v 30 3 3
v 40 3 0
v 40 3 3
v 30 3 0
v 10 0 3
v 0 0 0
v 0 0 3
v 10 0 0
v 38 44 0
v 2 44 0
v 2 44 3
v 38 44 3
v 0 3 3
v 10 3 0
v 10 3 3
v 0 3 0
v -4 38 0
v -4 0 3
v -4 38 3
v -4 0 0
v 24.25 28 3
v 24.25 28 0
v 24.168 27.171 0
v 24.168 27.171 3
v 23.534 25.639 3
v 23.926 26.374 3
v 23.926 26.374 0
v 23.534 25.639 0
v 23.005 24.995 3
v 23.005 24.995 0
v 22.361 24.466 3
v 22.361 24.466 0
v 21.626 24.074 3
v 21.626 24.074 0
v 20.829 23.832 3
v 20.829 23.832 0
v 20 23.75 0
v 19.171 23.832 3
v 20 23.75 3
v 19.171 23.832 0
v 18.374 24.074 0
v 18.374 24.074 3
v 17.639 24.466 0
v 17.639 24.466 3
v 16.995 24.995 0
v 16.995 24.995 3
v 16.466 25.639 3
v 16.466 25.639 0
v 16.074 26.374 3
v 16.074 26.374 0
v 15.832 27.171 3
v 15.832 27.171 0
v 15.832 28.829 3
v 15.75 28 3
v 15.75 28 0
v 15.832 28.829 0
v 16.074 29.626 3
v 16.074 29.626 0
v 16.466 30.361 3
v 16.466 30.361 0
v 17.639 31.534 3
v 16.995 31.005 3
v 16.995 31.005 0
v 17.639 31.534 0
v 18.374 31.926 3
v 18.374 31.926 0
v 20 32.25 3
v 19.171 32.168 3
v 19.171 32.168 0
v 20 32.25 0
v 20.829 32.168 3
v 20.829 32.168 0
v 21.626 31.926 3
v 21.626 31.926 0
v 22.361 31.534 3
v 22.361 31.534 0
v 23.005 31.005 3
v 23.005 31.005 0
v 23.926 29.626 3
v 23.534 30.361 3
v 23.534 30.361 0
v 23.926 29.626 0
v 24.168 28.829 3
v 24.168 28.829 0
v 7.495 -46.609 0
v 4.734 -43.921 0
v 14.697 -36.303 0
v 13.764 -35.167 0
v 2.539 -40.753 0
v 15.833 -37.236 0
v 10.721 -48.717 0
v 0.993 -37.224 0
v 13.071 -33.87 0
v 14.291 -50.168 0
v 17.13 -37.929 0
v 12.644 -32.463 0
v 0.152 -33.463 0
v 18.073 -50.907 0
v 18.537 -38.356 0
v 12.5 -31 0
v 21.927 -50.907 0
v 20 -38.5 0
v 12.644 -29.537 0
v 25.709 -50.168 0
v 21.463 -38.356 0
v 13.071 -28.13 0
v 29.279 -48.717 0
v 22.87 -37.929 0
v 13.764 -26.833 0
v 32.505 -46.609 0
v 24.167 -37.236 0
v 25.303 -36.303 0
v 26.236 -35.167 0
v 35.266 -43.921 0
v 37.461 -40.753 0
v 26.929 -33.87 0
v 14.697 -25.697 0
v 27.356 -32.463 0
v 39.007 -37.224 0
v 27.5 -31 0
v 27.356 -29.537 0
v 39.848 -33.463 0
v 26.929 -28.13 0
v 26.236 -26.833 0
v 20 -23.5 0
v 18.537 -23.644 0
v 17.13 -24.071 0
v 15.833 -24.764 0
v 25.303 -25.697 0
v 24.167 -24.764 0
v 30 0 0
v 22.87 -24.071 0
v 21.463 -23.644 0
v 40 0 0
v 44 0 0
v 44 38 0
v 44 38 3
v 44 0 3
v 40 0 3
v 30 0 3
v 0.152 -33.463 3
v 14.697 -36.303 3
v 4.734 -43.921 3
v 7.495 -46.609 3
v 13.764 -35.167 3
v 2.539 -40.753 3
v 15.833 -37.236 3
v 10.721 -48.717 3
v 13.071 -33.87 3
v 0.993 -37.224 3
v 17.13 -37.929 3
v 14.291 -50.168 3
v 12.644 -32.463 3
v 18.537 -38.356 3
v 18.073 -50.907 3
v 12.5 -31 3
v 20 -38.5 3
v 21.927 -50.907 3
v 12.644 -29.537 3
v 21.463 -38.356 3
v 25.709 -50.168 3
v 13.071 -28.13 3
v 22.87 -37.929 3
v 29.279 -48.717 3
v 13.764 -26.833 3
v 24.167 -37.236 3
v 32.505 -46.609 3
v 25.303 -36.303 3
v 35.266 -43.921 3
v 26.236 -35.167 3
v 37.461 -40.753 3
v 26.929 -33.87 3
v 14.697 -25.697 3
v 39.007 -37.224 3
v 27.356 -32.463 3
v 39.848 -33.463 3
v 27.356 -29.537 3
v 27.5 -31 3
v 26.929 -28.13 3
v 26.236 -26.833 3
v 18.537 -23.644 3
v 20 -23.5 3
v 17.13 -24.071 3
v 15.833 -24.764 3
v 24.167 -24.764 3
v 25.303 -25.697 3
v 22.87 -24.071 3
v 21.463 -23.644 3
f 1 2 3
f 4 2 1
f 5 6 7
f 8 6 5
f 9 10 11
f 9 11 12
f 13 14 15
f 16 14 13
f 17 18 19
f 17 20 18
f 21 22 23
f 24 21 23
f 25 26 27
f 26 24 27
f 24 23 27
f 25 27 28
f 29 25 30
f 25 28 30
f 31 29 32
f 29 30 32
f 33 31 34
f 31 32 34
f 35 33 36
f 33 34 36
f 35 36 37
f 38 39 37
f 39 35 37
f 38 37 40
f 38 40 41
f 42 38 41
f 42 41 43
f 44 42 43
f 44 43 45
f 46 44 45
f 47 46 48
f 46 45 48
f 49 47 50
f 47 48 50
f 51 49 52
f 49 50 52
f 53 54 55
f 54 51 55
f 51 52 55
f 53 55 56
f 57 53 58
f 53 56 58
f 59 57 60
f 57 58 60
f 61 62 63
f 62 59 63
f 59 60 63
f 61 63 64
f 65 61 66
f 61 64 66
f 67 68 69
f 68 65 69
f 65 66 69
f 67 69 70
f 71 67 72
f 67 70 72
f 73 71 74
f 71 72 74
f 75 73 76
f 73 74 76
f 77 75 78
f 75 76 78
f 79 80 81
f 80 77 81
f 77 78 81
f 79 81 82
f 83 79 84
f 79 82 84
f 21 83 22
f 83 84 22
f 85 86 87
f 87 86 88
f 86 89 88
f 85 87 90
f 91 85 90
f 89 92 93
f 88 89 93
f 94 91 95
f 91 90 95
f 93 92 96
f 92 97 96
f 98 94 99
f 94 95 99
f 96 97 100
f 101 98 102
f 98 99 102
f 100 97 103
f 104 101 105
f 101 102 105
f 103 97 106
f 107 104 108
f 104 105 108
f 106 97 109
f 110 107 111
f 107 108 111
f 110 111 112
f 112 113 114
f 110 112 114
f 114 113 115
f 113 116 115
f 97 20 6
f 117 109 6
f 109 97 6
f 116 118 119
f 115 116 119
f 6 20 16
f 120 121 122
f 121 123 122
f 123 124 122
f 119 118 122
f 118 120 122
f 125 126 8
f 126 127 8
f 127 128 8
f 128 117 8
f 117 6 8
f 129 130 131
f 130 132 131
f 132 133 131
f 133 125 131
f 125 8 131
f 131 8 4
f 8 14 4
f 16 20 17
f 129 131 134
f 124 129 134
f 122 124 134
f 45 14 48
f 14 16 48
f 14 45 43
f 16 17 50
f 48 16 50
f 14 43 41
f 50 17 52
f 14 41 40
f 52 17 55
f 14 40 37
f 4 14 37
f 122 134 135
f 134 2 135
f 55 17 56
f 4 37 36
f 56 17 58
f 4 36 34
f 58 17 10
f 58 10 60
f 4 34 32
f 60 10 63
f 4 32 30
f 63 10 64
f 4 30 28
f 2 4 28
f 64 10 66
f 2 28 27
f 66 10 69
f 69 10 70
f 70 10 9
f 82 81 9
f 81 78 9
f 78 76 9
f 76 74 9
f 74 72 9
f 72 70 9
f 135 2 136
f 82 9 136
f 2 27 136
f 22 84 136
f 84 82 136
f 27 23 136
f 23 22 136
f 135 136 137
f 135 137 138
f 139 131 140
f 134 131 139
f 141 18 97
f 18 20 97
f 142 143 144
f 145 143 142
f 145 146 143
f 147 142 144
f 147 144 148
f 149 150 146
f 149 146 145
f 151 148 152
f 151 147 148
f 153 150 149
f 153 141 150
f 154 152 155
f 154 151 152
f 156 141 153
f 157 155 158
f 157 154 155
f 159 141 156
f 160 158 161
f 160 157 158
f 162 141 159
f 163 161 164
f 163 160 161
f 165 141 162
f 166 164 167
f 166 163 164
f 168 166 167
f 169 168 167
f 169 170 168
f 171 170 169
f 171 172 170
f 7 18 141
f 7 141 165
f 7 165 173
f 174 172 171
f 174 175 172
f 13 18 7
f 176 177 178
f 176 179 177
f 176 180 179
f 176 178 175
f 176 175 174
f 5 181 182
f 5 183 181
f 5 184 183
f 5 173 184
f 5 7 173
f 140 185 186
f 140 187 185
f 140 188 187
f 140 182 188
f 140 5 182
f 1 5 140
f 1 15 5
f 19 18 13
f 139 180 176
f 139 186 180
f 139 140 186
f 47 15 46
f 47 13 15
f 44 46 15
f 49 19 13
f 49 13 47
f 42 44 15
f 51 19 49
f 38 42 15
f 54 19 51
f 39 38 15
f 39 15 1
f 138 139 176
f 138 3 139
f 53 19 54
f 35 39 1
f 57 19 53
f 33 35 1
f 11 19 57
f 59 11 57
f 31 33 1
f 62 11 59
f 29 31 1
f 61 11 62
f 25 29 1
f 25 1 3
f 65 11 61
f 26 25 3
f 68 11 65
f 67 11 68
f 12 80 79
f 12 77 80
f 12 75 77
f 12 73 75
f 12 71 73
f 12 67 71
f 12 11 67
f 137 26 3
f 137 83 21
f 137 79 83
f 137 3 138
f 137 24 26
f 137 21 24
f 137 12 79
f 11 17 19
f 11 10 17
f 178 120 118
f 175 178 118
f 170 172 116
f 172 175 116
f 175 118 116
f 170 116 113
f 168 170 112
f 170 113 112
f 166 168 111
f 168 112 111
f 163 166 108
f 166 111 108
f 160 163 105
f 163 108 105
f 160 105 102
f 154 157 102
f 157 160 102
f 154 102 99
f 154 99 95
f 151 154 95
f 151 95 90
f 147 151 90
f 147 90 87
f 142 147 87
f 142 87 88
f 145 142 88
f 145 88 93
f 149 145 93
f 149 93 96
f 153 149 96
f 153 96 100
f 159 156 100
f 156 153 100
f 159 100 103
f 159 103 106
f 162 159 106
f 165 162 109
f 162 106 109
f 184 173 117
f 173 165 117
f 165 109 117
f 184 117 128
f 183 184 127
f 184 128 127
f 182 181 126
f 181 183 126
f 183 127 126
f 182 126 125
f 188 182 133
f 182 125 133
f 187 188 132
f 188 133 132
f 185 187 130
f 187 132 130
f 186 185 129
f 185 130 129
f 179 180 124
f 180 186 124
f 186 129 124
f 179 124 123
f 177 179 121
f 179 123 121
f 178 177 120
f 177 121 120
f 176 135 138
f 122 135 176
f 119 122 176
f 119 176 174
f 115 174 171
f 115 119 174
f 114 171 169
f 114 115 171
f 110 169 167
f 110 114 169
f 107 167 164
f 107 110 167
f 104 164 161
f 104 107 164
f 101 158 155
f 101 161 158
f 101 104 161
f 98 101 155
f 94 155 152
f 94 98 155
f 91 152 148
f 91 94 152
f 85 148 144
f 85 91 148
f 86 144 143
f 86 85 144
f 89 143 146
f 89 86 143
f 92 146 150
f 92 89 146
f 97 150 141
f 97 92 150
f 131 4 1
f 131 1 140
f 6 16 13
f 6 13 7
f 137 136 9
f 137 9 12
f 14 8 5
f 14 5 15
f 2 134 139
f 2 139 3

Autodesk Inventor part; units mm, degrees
ref_plane "YZ Plane" through (0, 0, 0) normal (1, 0, 0) x (0, 1, 0)
ref_plane "XZ Plane" through (0, 0, 0) normal (0, 1, 0) x (-1, 0, 0)
ref_plane "XY Plane" through (0, 0, 0) normal (0, 0, 1) x (1, 0, 0)
sketch "Sketch1" plane through (0, 0, 0) normal (0, 0, 1) x (1, 0, 0)
  line L0 (0, 0) -> (10, 0)
  line L1 (10, 0) -> (10, 3)
  line L2 (10, 3) -> (0, 3)
  line L3 (0, 3) -> (0, 0)
  line L4 (30, 0) -> (40, 0)
  line L5 (40, 0) -> (40, 3)
  line L6 (40, 3) -> (30, 3)
  line L7 (30, 3) -> (30, 0)
  line L8 (0, 0) -> (40, 0)
  line L9 (40, 0) -> (40, 40)
  line L10 (40, 40) -> (0, 40)
  line L11 (0, 40) -> (0, 0)
  circle A0 centre (20, -31) radius 7.5
  circle A1 centre (20, -31) radius 20
  line L12 (-4, 44) -> (44, 44)
  line L13 (44, 44) -> (44, 0)
  line L14 (44, 0) -> (-4, 0)
  line L15 (-4, 0) -> (-4, 44)
  line L16 (-4, 0) -> (0.1522, -33.4628)
  line L17 (44, 0) -> (39.8478, -33.4628)
  circle A2 centre (20, 28) radius 4.25
  line L18 (10, 3) -> (30, 3)
  point P0 (20, 0)
  point P1 (1.3083, -38.1147)
  point P2 (38.6917, -38.1147)
  point P3 (30, 1.3205)
  point P4 (10, 1.3205)
  point P5 (8, 0)
  point P6 (32, 0)
  dimension "d0" = 10
  dimension "d1" = 3
  dimension "d2" = 10
  dimension "d3" = 20
  dimension "d4" = 40
  dimension "d5" = 15
  dimension "d6" = 40
  dimension "d7" = 31
  dimension "d9" = 4
  dimension "d10" = 4
  dimension "d11" = 4
  dimension "d12" = 8.5
  dimension "d17" = 25
extrude "Plate1" add sketch "Sketch1" along normal blind 3 contours L14 L15 L12 L13 L5 L9 L10 L11 L3 | L0 L8 L4 L14 L17 A1 L16 | L1 L18 L7 L8 | L11 L10 L9 L6 L18 L2 | A1
chamfer "Corner Chamfer1" distance 6 angle 45 2 edges at (-4, 44, 1.5) (44, 44, 1.5)
equation "\"d10\" = d9"
equation "\"d11\" = d10"
equation "\"d8\" = Thickness"
equation "\"BendRadius\" = Thickness"
equation "\"BendReliefWidth\" = Thickness"
equation "\"BendReliefDepth\" = 0.5 * Thickness"
equation "\"CornerReliefSize\" = 4 * Thickness"
equation "\"MinimumRemnant\" = 2 * Thickness"
equation "\"TransitionRadius\" = BendRadius"
equation "\"JacobiRadiusSize\" = BendRadius"
equation "\"GapSize\" = Thickness"
equation "\"Thickness\" = 3"
properties part number "A_beam_end_mound_2"
